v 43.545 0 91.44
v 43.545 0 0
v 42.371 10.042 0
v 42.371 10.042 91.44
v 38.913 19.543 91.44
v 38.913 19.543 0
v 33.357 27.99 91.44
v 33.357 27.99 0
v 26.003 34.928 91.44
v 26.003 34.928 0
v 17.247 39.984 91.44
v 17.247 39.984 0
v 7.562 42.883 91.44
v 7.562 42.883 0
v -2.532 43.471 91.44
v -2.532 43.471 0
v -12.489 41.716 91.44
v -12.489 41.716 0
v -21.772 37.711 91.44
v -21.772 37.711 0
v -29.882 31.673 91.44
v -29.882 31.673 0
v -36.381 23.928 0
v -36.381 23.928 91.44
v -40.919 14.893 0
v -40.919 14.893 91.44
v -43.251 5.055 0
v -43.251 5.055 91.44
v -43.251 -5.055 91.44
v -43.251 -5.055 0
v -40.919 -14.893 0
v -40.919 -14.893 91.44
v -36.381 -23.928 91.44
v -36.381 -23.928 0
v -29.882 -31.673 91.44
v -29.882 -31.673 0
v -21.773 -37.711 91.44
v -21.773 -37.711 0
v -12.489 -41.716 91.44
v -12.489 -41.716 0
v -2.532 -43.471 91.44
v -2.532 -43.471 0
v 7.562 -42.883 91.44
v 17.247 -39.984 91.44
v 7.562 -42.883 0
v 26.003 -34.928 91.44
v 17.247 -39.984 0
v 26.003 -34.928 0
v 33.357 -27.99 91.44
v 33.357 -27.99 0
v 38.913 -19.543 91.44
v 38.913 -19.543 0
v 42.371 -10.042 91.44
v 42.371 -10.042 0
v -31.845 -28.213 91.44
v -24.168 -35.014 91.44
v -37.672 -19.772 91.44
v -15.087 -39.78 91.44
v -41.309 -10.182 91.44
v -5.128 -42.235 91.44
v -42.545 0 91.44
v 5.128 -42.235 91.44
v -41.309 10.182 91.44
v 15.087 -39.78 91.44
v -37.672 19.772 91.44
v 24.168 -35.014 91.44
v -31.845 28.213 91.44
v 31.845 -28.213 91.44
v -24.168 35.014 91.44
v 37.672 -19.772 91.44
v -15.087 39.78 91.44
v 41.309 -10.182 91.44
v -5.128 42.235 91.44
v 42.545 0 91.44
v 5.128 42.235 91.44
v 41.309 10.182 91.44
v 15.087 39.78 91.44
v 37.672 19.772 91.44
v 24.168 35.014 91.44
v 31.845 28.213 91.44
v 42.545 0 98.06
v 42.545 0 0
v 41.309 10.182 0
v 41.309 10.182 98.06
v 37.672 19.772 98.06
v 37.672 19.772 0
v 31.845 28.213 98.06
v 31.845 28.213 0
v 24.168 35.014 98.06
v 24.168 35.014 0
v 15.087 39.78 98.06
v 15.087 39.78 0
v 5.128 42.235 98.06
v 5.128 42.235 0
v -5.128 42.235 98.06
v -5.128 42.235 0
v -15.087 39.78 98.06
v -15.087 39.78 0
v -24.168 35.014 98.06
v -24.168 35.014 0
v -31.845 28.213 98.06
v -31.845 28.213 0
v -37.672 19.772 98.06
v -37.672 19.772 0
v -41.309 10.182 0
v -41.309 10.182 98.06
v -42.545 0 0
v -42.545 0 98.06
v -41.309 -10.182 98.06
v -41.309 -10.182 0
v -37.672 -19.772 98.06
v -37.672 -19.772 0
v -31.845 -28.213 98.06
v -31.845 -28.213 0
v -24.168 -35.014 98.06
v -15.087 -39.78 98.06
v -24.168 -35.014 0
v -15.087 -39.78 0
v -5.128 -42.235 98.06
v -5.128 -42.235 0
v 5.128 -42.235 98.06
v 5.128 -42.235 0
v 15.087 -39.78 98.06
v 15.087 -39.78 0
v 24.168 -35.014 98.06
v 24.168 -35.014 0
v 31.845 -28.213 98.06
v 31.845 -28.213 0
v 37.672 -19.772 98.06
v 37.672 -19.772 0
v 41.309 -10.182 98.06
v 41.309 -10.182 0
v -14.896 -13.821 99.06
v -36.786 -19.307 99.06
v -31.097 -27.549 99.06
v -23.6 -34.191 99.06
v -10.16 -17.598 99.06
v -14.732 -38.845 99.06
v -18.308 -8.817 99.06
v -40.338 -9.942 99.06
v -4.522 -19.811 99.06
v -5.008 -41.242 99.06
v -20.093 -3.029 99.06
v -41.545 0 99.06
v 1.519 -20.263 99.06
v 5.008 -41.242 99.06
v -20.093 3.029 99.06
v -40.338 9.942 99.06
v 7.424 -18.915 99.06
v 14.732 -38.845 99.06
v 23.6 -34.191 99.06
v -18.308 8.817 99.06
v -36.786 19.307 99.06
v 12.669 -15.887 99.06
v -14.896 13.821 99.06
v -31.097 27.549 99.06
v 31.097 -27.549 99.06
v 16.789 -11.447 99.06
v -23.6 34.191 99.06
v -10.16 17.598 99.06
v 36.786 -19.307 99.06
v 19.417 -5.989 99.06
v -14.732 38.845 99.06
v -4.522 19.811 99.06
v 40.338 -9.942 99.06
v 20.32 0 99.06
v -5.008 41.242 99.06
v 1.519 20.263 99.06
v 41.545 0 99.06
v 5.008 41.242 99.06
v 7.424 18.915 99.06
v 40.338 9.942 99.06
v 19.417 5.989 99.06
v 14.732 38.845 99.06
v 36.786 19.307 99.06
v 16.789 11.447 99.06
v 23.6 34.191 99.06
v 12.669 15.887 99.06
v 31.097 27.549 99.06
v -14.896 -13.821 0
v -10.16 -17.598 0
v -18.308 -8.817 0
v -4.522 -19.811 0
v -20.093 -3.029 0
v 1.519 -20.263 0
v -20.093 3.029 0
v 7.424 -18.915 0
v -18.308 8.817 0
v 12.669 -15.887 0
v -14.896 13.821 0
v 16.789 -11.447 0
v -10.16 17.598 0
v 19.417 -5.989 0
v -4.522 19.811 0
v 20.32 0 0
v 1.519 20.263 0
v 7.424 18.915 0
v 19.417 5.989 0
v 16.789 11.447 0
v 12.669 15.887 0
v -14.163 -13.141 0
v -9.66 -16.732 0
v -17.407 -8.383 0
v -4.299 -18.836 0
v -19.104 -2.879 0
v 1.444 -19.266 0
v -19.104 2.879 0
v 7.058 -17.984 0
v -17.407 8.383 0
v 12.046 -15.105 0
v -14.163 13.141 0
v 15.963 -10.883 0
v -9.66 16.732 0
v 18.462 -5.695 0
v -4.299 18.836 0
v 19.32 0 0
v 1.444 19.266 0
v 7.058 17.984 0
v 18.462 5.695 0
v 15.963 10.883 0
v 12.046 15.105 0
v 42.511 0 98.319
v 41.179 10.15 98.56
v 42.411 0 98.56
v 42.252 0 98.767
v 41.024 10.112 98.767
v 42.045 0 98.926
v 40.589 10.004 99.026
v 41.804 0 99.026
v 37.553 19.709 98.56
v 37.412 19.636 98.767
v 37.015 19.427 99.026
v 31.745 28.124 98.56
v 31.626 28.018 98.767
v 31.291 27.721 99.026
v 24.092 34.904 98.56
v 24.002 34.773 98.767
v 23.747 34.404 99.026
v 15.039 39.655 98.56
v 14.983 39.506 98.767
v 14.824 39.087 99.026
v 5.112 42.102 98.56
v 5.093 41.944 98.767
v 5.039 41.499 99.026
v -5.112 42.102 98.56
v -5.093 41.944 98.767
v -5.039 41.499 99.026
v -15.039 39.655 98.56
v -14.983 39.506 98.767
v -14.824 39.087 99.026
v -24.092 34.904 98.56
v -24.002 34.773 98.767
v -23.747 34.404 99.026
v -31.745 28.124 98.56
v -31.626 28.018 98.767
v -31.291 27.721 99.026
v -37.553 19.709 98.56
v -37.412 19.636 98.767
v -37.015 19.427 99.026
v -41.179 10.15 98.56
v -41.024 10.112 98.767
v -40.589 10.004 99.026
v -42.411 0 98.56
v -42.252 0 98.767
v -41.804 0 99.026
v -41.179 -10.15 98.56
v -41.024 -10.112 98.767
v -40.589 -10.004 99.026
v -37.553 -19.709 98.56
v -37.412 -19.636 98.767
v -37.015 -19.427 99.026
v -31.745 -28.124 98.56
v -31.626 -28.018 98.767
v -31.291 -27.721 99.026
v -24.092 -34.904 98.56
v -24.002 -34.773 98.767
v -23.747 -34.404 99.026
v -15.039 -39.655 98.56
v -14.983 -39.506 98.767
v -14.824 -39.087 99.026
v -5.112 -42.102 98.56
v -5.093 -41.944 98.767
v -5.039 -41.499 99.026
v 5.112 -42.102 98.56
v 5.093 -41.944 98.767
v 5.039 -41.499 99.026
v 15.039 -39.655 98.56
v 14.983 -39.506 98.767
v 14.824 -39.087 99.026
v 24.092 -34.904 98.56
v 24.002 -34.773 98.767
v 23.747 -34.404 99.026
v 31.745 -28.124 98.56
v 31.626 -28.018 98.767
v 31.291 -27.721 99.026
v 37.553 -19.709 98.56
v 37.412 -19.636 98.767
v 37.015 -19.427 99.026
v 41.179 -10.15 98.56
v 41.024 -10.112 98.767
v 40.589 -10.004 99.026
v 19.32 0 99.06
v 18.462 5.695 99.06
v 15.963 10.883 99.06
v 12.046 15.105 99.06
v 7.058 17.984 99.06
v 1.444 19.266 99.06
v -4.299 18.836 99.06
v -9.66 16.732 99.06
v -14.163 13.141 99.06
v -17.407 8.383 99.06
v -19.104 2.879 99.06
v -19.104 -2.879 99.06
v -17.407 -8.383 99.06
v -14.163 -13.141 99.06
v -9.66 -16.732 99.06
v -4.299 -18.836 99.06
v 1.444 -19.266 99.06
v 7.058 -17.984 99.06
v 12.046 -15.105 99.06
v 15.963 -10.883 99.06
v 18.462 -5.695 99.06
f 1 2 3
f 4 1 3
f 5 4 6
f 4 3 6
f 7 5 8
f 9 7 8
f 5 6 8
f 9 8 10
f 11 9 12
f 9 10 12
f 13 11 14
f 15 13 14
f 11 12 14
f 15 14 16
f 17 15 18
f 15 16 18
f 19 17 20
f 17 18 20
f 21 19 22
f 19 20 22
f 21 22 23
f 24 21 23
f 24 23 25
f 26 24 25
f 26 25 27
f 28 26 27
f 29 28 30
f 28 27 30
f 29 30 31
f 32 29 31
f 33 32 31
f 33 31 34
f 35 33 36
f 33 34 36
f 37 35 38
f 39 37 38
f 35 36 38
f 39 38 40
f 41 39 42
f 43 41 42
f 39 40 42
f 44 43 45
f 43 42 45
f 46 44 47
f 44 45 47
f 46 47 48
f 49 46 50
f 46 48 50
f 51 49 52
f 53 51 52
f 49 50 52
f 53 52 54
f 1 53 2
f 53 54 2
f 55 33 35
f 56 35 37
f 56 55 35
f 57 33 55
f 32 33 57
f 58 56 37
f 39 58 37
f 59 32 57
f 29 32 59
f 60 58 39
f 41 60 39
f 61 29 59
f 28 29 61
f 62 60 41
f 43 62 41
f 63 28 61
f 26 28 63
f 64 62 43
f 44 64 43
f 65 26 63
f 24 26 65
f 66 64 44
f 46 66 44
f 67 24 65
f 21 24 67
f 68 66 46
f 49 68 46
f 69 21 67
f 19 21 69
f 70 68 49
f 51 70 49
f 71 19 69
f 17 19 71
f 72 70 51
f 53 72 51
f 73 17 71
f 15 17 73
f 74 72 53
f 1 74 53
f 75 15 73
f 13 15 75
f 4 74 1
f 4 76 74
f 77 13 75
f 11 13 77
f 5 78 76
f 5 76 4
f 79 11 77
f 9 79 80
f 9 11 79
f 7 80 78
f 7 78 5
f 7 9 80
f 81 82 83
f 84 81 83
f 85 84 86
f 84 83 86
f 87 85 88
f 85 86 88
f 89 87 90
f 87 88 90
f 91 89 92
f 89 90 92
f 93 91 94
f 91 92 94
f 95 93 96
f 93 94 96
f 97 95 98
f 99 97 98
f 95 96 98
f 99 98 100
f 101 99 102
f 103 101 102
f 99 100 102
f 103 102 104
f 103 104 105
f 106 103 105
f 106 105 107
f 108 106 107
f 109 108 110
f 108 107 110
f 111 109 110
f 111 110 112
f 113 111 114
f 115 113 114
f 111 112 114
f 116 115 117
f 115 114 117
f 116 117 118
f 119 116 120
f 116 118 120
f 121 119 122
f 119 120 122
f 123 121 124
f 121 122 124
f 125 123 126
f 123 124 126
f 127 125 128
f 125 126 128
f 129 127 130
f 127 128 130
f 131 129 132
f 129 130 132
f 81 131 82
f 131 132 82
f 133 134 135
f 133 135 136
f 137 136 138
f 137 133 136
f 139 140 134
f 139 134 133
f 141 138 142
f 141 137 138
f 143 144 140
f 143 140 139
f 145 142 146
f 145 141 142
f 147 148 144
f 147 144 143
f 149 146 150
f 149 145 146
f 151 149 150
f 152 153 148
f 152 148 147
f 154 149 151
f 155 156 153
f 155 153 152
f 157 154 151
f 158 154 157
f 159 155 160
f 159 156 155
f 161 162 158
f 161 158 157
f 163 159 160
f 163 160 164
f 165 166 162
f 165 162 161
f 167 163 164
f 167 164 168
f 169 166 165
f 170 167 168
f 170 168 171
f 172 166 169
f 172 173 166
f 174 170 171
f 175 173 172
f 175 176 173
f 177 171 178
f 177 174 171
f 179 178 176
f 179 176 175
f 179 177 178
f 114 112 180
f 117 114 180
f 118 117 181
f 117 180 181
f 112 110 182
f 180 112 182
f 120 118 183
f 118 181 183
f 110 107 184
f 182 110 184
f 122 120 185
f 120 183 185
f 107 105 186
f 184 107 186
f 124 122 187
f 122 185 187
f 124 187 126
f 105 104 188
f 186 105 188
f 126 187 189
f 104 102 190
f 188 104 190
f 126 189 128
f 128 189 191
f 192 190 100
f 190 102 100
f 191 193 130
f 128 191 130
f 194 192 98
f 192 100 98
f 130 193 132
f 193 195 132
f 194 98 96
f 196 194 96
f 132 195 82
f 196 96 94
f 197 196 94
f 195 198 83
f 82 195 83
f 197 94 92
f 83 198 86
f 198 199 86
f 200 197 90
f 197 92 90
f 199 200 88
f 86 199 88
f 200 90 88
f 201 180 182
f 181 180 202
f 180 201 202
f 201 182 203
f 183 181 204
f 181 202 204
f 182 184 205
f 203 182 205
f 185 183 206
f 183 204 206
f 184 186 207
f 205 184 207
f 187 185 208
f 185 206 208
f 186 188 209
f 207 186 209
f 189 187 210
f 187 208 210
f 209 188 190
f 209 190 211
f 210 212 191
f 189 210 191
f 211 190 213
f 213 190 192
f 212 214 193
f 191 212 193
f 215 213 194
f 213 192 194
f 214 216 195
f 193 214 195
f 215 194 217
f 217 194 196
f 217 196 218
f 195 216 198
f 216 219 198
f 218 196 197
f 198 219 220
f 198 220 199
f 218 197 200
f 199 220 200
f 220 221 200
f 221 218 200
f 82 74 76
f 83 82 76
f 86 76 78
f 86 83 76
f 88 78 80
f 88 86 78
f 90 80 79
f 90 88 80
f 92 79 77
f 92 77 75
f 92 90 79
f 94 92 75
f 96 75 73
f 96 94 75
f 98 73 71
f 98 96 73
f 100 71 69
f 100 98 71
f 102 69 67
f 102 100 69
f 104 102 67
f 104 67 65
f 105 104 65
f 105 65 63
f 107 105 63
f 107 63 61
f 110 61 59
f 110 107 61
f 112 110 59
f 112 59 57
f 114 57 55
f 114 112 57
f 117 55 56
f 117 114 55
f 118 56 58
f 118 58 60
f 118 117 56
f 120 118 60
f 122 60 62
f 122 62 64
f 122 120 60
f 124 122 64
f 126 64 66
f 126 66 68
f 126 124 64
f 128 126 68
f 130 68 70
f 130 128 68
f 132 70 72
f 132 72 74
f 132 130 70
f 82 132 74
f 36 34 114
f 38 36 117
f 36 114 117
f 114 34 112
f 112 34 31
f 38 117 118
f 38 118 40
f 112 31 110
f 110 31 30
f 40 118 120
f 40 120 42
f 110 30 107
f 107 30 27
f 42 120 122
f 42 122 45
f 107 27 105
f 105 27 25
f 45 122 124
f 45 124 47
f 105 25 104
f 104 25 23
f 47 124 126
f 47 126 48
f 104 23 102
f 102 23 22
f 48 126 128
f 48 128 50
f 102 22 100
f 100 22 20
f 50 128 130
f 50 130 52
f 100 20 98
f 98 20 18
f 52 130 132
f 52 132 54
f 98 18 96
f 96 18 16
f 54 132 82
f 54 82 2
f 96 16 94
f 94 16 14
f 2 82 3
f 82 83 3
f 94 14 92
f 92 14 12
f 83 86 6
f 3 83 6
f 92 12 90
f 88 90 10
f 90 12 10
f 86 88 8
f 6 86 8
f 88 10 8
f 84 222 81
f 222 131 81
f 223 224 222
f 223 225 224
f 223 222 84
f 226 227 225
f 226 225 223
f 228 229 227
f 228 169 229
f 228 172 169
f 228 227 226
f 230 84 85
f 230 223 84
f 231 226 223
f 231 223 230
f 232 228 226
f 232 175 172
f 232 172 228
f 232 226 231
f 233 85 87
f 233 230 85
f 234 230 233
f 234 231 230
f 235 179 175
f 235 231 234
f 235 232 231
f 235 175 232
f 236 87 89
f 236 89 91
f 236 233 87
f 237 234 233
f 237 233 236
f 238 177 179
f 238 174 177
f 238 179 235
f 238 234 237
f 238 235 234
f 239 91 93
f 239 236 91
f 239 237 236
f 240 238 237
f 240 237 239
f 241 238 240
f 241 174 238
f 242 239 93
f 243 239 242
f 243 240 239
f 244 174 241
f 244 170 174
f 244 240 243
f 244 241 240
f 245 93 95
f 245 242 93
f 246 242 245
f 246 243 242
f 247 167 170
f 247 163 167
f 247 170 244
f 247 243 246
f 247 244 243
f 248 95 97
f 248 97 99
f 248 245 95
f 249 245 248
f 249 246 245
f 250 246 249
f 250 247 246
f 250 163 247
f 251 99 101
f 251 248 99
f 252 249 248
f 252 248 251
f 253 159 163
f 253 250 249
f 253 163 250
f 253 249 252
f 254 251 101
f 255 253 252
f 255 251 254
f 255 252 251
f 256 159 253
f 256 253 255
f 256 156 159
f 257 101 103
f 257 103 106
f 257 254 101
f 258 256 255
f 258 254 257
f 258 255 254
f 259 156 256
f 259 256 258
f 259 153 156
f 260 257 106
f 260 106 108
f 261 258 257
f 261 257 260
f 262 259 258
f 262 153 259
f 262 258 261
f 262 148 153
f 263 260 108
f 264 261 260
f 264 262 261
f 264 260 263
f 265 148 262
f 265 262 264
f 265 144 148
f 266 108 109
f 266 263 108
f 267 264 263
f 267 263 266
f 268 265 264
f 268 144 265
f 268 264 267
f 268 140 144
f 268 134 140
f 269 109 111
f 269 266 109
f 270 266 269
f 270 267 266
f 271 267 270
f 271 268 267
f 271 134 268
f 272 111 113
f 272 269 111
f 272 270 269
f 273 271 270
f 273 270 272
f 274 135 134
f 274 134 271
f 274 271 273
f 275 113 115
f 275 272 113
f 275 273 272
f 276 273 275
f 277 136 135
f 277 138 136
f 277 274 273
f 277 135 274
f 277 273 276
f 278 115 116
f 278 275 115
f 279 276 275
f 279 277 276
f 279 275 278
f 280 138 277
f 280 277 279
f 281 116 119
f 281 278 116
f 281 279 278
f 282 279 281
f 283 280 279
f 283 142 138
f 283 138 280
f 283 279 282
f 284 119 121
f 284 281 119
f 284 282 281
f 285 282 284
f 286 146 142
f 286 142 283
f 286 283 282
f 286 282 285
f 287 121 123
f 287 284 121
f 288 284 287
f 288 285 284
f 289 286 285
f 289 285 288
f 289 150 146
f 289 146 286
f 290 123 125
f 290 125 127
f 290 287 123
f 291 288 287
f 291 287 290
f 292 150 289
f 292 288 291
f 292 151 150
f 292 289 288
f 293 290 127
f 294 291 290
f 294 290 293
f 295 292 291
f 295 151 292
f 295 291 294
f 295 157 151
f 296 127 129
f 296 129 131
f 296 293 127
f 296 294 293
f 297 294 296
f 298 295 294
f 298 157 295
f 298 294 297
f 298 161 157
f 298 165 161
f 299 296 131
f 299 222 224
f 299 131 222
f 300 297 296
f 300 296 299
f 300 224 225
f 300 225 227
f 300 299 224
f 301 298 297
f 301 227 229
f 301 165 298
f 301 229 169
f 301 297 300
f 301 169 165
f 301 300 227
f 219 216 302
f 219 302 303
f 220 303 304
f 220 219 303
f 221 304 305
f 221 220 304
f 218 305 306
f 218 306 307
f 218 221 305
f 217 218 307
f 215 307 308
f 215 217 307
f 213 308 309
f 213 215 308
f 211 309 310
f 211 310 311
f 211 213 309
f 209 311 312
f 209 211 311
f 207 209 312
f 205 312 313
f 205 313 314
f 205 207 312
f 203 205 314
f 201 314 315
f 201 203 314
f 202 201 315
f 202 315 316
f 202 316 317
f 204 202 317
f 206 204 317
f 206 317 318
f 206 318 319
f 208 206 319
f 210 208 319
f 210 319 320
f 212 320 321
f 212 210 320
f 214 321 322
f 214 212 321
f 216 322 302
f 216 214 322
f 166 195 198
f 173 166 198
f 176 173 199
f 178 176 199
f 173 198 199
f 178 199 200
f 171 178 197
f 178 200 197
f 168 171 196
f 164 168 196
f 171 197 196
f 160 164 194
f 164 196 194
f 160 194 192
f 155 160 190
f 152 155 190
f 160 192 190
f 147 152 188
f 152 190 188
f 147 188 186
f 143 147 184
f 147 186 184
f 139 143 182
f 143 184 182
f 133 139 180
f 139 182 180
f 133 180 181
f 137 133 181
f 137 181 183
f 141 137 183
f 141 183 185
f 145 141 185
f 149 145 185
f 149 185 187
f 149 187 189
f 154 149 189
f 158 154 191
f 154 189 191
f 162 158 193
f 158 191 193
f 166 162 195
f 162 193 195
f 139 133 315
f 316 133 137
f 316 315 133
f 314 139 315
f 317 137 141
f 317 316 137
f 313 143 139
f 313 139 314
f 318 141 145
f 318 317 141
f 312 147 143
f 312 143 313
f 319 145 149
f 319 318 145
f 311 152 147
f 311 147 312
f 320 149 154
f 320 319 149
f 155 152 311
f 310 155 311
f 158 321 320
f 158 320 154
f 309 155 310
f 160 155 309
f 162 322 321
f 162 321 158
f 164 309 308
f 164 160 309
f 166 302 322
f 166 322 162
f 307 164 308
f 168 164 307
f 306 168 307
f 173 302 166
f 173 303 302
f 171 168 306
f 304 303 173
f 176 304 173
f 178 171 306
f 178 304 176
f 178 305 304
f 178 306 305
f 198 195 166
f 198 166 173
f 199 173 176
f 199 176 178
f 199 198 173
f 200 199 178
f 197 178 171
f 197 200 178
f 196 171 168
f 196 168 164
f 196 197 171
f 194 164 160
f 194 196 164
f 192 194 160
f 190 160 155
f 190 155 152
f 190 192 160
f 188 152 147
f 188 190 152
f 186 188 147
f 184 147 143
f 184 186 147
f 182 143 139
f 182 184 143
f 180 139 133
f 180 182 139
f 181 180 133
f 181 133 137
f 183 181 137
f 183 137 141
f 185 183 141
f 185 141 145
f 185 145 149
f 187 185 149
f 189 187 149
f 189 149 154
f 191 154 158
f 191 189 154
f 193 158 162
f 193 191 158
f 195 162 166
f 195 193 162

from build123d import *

# Parameters (mm, degrees)
F0_R     = 42.545
F0_R_2   = 20.32
F1_DEPTH = 99.06
F2_R     = 1
F0_R_3   = 19.32
F3_DEPTH = 99.06
F0_R_4   = 43.545
F4_DEPTH = 91.44


with BuildPart() as f1:
    # F0 (on Top) → F1 (new body)
    with BuildSketch(Plane.XY):
        Circle(F0_R)
        Circle(F0_R_2, mode=Mode.SUBTRACT)
    extrude(amount=F1_DEPTH)

    # F2
    f2_edges = [f1.edges().sort_by_distance(p)[0] for p in [
        (-42.545, 0, 99.06),
    ]]
    fillet(f2_edges, radius=F2_R)


with BuildPart() as f3:
    # F0 (on Top) → F3 (new body)
    with BuildSketch(Plane.XY):
        Circle(F0_R_2)
        Circle(F0_R_3, mode=Mode.SUBTRACT)
    extrude(amount=F3_DEPTH)


with BuildPart() as f4:
    # F0 (on Top) → F4 (new body)
    with BuildSketch(Plane.XY):
        Circle(F0_R_4)
        Circle(F0_R, mode=Mode.SUBTRACT)
    extrude(amount=F4_DEPTH)


solid = Compound([f1.part, f3.part, f4.part])
